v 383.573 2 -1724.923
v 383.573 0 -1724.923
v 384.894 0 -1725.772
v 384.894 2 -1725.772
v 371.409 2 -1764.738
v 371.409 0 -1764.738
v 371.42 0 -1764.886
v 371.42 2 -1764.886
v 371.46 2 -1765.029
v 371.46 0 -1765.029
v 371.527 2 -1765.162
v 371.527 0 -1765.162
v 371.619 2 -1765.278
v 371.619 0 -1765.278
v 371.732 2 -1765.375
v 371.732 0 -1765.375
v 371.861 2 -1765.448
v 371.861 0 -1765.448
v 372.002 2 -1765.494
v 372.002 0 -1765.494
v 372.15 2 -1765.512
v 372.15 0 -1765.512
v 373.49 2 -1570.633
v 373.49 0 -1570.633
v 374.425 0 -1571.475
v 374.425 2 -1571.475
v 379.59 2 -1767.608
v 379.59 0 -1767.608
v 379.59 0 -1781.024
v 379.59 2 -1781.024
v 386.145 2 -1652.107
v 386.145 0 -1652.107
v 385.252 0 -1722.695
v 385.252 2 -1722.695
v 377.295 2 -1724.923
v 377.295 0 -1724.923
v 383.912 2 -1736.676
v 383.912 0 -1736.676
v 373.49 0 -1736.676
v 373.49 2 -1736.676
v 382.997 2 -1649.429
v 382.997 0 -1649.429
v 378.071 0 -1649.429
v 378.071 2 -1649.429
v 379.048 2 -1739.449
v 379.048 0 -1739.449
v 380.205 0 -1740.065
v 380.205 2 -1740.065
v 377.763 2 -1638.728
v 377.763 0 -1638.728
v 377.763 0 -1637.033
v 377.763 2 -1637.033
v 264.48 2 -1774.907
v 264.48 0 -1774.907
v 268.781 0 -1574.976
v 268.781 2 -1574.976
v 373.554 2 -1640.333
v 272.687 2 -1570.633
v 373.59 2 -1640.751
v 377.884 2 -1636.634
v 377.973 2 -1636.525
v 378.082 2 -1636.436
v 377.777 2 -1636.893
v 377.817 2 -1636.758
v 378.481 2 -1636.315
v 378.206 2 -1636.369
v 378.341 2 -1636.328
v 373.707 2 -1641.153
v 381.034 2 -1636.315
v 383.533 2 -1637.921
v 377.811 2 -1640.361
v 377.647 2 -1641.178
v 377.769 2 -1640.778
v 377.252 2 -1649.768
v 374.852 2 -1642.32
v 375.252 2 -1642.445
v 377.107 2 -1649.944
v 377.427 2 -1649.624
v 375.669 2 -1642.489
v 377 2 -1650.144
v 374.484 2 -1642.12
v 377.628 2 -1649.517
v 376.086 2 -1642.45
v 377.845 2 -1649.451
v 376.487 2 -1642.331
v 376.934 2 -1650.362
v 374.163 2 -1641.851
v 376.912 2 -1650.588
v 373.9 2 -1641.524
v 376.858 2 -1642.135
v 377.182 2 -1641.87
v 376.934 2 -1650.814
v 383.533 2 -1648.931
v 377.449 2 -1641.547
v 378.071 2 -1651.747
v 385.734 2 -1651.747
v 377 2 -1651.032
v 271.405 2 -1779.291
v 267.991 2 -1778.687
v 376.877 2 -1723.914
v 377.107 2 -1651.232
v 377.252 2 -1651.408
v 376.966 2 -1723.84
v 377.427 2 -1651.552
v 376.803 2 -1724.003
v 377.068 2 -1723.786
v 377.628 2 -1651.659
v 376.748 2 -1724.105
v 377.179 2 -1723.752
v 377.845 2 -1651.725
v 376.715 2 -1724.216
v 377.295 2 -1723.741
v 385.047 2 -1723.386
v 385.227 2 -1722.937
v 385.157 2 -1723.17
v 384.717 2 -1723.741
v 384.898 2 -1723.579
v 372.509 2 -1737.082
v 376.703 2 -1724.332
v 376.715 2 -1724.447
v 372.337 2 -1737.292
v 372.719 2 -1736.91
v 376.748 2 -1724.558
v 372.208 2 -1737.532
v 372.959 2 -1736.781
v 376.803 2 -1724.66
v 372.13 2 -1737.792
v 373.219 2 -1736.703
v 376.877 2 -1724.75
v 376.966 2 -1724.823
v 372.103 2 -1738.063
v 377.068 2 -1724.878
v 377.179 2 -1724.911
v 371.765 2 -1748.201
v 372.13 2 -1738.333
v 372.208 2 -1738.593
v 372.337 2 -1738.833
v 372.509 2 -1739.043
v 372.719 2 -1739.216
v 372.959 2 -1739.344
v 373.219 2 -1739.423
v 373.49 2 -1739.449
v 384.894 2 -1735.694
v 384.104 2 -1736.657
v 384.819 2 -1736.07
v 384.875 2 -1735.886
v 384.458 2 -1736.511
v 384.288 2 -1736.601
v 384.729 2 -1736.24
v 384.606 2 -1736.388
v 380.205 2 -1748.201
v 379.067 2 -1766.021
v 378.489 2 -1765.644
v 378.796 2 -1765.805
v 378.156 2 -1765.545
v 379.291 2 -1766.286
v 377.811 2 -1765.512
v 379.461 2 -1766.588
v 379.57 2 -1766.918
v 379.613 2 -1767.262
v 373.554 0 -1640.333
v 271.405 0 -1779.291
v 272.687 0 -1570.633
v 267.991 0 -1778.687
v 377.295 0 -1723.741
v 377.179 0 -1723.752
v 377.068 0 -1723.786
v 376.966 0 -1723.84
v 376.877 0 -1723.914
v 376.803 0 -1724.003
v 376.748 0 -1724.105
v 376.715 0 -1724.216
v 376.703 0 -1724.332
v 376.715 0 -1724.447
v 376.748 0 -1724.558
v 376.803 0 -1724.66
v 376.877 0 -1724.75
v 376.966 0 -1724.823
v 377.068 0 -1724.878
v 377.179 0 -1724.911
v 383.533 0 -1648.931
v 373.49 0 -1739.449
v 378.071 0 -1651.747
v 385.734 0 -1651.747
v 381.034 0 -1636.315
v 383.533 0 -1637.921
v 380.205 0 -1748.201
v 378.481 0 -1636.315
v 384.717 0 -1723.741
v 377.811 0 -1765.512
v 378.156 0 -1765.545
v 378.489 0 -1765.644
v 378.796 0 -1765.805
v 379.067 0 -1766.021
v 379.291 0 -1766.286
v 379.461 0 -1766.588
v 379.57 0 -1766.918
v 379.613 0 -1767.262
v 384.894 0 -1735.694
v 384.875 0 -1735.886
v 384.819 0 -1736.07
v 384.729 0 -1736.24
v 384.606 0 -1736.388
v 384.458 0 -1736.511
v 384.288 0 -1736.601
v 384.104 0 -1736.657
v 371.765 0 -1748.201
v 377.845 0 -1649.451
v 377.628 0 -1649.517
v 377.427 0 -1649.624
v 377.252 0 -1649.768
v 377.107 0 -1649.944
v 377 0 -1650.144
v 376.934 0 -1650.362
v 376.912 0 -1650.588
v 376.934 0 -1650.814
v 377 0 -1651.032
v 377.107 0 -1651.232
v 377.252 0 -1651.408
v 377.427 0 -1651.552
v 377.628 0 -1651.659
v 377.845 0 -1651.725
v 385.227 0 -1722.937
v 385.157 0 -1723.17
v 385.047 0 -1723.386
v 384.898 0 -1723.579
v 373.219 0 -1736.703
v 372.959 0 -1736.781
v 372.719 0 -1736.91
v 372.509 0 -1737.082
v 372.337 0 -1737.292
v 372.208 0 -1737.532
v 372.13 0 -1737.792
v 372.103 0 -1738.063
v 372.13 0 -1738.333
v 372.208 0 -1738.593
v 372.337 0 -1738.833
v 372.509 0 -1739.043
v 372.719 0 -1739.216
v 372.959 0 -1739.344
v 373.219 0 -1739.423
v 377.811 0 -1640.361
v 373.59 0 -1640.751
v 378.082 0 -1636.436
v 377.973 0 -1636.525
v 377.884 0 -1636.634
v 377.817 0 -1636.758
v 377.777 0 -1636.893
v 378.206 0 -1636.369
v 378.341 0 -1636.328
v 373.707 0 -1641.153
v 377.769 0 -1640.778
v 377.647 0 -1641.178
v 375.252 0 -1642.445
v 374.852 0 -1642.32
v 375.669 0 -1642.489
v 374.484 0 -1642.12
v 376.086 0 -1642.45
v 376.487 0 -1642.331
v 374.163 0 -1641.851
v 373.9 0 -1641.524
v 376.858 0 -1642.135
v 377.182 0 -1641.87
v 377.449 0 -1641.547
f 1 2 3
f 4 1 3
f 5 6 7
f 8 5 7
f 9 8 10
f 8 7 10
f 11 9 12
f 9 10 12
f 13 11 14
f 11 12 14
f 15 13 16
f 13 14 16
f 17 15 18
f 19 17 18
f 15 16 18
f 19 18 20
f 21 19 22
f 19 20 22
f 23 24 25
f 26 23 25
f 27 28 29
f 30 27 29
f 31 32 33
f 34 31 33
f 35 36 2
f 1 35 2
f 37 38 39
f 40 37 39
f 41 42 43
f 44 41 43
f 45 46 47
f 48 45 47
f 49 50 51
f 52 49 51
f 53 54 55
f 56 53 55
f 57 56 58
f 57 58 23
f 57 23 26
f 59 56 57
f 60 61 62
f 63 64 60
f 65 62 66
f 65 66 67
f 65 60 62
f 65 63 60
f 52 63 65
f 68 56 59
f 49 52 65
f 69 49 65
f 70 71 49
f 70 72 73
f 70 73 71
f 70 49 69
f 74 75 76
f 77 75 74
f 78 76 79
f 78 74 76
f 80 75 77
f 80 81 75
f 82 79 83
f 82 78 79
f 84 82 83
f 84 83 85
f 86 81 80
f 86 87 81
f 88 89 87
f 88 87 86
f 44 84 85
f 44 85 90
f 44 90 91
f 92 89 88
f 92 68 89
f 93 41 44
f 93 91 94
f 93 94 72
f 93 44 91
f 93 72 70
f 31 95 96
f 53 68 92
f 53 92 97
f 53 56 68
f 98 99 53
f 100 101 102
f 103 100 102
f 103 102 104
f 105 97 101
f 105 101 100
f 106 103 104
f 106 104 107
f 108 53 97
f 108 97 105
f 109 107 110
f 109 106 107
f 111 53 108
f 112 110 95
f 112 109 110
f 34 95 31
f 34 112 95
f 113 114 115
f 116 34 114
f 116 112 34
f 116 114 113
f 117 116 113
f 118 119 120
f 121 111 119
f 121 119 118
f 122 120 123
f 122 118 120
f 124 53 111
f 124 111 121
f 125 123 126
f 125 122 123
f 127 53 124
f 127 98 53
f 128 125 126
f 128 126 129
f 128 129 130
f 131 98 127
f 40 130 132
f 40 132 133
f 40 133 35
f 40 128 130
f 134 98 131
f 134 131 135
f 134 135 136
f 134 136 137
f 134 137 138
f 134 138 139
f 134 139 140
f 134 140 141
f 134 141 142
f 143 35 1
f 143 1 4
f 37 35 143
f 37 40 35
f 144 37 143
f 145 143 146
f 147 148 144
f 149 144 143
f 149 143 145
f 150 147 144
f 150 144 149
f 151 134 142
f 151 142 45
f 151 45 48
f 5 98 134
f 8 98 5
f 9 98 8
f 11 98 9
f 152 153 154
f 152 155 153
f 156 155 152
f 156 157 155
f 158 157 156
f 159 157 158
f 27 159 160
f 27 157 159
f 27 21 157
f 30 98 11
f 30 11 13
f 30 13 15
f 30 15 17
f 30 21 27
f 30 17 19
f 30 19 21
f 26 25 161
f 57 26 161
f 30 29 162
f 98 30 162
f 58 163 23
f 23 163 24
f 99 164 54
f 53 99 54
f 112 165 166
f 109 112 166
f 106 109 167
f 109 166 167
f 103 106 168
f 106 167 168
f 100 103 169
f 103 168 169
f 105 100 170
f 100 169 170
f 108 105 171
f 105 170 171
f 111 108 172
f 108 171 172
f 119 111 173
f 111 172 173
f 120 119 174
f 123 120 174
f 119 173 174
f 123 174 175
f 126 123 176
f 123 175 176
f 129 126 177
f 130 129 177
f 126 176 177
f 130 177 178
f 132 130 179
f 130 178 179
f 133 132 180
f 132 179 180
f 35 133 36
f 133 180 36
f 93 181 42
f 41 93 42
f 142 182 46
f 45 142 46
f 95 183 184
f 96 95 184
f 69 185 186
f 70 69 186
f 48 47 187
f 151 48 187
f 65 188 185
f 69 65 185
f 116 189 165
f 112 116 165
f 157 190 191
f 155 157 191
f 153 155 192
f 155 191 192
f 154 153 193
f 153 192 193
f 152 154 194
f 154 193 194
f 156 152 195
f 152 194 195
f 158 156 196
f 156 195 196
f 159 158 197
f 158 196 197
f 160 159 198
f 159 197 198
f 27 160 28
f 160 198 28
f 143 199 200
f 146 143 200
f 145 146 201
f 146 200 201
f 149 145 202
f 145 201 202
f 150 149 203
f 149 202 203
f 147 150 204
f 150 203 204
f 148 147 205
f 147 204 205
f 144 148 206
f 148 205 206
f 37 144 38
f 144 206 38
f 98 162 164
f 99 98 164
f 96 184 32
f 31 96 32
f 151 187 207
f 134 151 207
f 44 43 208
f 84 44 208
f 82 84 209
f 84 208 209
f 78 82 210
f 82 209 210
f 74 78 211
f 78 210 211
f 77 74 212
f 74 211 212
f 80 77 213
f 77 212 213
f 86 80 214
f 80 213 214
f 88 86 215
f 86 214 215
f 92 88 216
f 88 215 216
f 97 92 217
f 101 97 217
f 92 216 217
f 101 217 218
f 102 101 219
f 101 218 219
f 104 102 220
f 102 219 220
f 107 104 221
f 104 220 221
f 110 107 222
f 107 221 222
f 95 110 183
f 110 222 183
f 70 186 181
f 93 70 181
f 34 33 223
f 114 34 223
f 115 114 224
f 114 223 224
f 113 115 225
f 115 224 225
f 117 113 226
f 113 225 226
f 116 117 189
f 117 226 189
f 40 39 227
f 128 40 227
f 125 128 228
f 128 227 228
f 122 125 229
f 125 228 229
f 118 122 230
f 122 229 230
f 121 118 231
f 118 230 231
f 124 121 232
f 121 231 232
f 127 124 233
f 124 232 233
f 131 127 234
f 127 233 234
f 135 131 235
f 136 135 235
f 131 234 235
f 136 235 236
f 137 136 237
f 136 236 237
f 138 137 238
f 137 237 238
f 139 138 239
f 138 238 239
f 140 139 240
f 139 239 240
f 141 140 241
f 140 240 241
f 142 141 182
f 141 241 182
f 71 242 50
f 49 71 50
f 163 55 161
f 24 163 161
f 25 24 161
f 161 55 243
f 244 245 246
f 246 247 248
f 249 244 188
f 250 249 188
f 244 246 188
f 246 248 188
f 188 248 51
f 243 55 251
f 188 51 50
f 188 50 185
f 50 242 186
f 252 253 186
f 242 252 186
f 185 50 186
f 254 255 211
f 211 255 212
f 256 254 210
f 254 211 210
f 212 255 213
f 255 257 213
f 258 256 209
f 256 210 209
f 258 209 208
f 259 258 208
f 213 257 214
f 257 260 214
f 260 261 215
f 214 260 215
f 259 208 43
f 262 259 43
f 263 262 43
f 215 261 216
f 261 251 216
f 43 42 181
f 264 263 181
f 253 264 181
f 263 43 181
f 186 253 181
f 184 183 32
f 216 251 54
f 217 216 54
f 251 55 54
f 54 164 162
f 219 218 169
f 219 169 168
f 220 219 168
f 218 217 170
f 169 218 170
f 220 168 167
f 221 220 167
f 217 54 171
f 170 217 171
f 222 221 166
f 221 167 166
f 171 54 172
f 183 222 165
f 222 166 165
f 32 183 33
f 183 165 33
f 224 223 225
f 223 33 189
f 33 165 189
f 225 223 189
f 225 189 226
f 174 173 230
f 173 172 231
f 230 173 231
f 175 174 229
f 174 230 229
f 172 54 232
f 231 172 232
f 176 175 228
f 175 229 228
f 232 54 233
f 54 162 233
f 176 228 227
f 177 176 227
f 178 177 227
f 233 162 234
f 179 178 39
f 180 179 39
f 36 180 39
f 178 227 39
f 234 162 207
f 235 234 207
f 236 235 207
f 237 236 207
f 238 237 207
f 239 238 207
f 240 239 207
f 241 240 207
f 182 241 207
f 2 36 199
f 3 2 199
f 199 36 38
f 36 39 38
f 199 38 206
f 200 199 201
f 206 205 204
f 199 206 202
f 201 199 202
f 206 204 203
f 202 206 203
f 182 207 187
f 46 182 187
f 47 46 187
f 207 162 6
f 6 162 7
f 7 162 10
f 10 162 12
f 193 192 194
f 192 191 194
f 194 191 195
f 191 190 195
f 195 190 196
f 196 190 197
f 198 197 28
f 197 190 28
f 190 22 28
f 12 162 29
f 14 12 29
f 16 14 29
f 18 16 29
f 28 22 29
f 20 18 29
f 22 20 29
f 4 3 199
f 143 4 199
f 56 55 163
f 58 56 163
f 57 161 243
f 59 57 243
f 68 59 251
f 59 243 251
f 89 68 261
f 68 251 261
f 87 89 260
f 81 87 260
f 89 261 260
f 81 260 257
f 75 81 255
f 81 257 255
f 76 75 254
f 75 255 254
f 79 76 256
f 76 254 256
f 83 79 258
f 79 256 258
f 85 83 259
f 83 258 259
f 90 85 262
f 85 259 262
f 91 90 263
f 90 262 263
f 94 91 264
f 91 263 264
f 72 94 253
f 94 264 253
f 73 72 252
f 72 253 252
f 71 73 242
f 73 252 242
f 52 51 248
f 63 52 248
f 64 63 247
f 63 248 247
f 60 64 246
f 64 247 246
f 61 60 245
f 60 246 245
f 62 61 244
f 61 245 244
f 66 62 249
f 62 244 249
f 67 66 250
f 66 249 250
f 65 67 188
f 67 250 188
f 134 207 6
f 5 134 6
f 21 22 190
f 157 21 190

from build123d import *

# Parameters (mm, degrees)
BOSS_EXTRUDE1_DEPTH = 2


with BuildPart() as part:
    # Sketch2 → Boss-Extrude1 (new body)
    with BuildSketch(Plane(origin=(0, 0, 0), x_dir=(1, 0, 0), z_dir=(0, 1, 0))):
        with BuildLine():
            Line((377.810759056, 1640.360670751), (377.762780786, 1638.727684223))
            Line((377.762780786, 1638.727684223), (377.762780786, 1637.032768164))
            ThreePointArc((377.762780786, 1637.032768164), (377.973133338, 1636.52493218), (378.480969321, 1636.314579628))
            Line((378.480969321, 1636.314579628), (381.034322317, 1636.314579628))
            Line((381.034322317, 1636.314579628), (383.53259373, 1637.921344077))
            Line((383.53259373, 1637.921344077), (383.53259373, 1648.93129383))
            Line((383.53259373, 1648.93129383), (382.997065463, 1649.428721271))
            Line((382.997065463, 1649.428721271), (378.071384282, 1649.428721271))
            ThreePointArc((378.071384282, 1649.428721271), (376.912121238, 1650.587984315), (378.071384282, 1651.747247359))
            Line((378.071384282, 1651.747247359), (385.733950351, 1651.747247359))
            Line((385.733950351, 1651.747247359), (386.145150231, 1652.107387132))
            Line((386.145150231, 1652.107387132), (385.251957701, 1722.695235293))
            ThreePointArc((385.251957701, 1722.695235293), (385.107061178, 1723.280508889), (384.717360317, 1723.740588689))
            Line((384.717360317, 1723.740588689), (377.294522639, 1723.740588689))
            ThreePointArc((377.294522639, 1723.740588689), (376.703471551, 1724.331639778), (377.294522639, 1724.922690866))
            Line((377.294522639, 1724.922690866), (383.5733207, 1724.922690866))
            Line((383.5733207, 1724.922690866), (384.893964101, 1725.772063299))
            Line((384.893964101, 1725.772063299), (384.893964101, 1735.694301181))
            ThreePointArc((384.893964101, 1735.694301181), (384.606449822, 1736.388422052), (383.912328951, 1736.675936331))
            Line((383.912328951, 1736.675936331), (373.489641238, 1736.675936331))
            ThreePointArc((373.489641238, 1736.675936331), (372.1028909, 1738.062686668), (373.489641238, 1739.449437006))
            Line((373.489641238, 1739.449437006), (379.048025738, 1739.449437006))
            Line((379.048025738, 1739.449437006), (380.205497535, 1740.065323077))
            Line((380.205497535, 1740.065323077), (380.205497535, 1748.201358299))
            Line((380.205497535, 1748.201358299), (371.764667819, 1748.201358299))
            Line((371.764667819, 1748.201358299), (371.408873695, 1764.738317132))
            ThreePointArc((371.408873695, 1764.738317132), (371.619067882, 1765.278343177), (372.149553695, 1765.511569521))
            Line((372.149553695, 1765.511569521), (377.810759056, 1765.511569521))
            ThreePointArc((377.810759056, 1765.511569521), (379.185604537, 1766.148142401), (379.589611464, 1767.608349076))
            Line((379.589611464, 1767.608349076), (379.589611464, 1781.024075112))
            Line((379.589611464, 1781.024075112), (271.404811714, 1779.291132304))
            Line((271.404811714, 1779.291132304), (267.990517204, 1778.686872698))
            Line((267.990517204, 1778.686872698), (264.479907812, 1774.907365565))
            Line((264.479907812, 1774.907365565), (268.781456477, 1574.975639595))
            Line((268.781456477, 1574.975639595), (272.687420737, 1570.633405031))
            Line((272.687420737, 1570.633405031), (373.489641238, 1570.633405031))
            Line((373.489641238, 1570.633405031), (374.425169749, 1571.4749397))
            Line((374.425169749, 1571.4749397), (373.553861857, 1640.333273274))
            ThreePointArc((373.553861857, 1640.333273274), (375.668526286, 1642.488694532), (377.810759056, 1640.360670751))
        make_face()
    extrude(amount=BOSS_EXTRUDE1_DEPTH)


solid = part.part
